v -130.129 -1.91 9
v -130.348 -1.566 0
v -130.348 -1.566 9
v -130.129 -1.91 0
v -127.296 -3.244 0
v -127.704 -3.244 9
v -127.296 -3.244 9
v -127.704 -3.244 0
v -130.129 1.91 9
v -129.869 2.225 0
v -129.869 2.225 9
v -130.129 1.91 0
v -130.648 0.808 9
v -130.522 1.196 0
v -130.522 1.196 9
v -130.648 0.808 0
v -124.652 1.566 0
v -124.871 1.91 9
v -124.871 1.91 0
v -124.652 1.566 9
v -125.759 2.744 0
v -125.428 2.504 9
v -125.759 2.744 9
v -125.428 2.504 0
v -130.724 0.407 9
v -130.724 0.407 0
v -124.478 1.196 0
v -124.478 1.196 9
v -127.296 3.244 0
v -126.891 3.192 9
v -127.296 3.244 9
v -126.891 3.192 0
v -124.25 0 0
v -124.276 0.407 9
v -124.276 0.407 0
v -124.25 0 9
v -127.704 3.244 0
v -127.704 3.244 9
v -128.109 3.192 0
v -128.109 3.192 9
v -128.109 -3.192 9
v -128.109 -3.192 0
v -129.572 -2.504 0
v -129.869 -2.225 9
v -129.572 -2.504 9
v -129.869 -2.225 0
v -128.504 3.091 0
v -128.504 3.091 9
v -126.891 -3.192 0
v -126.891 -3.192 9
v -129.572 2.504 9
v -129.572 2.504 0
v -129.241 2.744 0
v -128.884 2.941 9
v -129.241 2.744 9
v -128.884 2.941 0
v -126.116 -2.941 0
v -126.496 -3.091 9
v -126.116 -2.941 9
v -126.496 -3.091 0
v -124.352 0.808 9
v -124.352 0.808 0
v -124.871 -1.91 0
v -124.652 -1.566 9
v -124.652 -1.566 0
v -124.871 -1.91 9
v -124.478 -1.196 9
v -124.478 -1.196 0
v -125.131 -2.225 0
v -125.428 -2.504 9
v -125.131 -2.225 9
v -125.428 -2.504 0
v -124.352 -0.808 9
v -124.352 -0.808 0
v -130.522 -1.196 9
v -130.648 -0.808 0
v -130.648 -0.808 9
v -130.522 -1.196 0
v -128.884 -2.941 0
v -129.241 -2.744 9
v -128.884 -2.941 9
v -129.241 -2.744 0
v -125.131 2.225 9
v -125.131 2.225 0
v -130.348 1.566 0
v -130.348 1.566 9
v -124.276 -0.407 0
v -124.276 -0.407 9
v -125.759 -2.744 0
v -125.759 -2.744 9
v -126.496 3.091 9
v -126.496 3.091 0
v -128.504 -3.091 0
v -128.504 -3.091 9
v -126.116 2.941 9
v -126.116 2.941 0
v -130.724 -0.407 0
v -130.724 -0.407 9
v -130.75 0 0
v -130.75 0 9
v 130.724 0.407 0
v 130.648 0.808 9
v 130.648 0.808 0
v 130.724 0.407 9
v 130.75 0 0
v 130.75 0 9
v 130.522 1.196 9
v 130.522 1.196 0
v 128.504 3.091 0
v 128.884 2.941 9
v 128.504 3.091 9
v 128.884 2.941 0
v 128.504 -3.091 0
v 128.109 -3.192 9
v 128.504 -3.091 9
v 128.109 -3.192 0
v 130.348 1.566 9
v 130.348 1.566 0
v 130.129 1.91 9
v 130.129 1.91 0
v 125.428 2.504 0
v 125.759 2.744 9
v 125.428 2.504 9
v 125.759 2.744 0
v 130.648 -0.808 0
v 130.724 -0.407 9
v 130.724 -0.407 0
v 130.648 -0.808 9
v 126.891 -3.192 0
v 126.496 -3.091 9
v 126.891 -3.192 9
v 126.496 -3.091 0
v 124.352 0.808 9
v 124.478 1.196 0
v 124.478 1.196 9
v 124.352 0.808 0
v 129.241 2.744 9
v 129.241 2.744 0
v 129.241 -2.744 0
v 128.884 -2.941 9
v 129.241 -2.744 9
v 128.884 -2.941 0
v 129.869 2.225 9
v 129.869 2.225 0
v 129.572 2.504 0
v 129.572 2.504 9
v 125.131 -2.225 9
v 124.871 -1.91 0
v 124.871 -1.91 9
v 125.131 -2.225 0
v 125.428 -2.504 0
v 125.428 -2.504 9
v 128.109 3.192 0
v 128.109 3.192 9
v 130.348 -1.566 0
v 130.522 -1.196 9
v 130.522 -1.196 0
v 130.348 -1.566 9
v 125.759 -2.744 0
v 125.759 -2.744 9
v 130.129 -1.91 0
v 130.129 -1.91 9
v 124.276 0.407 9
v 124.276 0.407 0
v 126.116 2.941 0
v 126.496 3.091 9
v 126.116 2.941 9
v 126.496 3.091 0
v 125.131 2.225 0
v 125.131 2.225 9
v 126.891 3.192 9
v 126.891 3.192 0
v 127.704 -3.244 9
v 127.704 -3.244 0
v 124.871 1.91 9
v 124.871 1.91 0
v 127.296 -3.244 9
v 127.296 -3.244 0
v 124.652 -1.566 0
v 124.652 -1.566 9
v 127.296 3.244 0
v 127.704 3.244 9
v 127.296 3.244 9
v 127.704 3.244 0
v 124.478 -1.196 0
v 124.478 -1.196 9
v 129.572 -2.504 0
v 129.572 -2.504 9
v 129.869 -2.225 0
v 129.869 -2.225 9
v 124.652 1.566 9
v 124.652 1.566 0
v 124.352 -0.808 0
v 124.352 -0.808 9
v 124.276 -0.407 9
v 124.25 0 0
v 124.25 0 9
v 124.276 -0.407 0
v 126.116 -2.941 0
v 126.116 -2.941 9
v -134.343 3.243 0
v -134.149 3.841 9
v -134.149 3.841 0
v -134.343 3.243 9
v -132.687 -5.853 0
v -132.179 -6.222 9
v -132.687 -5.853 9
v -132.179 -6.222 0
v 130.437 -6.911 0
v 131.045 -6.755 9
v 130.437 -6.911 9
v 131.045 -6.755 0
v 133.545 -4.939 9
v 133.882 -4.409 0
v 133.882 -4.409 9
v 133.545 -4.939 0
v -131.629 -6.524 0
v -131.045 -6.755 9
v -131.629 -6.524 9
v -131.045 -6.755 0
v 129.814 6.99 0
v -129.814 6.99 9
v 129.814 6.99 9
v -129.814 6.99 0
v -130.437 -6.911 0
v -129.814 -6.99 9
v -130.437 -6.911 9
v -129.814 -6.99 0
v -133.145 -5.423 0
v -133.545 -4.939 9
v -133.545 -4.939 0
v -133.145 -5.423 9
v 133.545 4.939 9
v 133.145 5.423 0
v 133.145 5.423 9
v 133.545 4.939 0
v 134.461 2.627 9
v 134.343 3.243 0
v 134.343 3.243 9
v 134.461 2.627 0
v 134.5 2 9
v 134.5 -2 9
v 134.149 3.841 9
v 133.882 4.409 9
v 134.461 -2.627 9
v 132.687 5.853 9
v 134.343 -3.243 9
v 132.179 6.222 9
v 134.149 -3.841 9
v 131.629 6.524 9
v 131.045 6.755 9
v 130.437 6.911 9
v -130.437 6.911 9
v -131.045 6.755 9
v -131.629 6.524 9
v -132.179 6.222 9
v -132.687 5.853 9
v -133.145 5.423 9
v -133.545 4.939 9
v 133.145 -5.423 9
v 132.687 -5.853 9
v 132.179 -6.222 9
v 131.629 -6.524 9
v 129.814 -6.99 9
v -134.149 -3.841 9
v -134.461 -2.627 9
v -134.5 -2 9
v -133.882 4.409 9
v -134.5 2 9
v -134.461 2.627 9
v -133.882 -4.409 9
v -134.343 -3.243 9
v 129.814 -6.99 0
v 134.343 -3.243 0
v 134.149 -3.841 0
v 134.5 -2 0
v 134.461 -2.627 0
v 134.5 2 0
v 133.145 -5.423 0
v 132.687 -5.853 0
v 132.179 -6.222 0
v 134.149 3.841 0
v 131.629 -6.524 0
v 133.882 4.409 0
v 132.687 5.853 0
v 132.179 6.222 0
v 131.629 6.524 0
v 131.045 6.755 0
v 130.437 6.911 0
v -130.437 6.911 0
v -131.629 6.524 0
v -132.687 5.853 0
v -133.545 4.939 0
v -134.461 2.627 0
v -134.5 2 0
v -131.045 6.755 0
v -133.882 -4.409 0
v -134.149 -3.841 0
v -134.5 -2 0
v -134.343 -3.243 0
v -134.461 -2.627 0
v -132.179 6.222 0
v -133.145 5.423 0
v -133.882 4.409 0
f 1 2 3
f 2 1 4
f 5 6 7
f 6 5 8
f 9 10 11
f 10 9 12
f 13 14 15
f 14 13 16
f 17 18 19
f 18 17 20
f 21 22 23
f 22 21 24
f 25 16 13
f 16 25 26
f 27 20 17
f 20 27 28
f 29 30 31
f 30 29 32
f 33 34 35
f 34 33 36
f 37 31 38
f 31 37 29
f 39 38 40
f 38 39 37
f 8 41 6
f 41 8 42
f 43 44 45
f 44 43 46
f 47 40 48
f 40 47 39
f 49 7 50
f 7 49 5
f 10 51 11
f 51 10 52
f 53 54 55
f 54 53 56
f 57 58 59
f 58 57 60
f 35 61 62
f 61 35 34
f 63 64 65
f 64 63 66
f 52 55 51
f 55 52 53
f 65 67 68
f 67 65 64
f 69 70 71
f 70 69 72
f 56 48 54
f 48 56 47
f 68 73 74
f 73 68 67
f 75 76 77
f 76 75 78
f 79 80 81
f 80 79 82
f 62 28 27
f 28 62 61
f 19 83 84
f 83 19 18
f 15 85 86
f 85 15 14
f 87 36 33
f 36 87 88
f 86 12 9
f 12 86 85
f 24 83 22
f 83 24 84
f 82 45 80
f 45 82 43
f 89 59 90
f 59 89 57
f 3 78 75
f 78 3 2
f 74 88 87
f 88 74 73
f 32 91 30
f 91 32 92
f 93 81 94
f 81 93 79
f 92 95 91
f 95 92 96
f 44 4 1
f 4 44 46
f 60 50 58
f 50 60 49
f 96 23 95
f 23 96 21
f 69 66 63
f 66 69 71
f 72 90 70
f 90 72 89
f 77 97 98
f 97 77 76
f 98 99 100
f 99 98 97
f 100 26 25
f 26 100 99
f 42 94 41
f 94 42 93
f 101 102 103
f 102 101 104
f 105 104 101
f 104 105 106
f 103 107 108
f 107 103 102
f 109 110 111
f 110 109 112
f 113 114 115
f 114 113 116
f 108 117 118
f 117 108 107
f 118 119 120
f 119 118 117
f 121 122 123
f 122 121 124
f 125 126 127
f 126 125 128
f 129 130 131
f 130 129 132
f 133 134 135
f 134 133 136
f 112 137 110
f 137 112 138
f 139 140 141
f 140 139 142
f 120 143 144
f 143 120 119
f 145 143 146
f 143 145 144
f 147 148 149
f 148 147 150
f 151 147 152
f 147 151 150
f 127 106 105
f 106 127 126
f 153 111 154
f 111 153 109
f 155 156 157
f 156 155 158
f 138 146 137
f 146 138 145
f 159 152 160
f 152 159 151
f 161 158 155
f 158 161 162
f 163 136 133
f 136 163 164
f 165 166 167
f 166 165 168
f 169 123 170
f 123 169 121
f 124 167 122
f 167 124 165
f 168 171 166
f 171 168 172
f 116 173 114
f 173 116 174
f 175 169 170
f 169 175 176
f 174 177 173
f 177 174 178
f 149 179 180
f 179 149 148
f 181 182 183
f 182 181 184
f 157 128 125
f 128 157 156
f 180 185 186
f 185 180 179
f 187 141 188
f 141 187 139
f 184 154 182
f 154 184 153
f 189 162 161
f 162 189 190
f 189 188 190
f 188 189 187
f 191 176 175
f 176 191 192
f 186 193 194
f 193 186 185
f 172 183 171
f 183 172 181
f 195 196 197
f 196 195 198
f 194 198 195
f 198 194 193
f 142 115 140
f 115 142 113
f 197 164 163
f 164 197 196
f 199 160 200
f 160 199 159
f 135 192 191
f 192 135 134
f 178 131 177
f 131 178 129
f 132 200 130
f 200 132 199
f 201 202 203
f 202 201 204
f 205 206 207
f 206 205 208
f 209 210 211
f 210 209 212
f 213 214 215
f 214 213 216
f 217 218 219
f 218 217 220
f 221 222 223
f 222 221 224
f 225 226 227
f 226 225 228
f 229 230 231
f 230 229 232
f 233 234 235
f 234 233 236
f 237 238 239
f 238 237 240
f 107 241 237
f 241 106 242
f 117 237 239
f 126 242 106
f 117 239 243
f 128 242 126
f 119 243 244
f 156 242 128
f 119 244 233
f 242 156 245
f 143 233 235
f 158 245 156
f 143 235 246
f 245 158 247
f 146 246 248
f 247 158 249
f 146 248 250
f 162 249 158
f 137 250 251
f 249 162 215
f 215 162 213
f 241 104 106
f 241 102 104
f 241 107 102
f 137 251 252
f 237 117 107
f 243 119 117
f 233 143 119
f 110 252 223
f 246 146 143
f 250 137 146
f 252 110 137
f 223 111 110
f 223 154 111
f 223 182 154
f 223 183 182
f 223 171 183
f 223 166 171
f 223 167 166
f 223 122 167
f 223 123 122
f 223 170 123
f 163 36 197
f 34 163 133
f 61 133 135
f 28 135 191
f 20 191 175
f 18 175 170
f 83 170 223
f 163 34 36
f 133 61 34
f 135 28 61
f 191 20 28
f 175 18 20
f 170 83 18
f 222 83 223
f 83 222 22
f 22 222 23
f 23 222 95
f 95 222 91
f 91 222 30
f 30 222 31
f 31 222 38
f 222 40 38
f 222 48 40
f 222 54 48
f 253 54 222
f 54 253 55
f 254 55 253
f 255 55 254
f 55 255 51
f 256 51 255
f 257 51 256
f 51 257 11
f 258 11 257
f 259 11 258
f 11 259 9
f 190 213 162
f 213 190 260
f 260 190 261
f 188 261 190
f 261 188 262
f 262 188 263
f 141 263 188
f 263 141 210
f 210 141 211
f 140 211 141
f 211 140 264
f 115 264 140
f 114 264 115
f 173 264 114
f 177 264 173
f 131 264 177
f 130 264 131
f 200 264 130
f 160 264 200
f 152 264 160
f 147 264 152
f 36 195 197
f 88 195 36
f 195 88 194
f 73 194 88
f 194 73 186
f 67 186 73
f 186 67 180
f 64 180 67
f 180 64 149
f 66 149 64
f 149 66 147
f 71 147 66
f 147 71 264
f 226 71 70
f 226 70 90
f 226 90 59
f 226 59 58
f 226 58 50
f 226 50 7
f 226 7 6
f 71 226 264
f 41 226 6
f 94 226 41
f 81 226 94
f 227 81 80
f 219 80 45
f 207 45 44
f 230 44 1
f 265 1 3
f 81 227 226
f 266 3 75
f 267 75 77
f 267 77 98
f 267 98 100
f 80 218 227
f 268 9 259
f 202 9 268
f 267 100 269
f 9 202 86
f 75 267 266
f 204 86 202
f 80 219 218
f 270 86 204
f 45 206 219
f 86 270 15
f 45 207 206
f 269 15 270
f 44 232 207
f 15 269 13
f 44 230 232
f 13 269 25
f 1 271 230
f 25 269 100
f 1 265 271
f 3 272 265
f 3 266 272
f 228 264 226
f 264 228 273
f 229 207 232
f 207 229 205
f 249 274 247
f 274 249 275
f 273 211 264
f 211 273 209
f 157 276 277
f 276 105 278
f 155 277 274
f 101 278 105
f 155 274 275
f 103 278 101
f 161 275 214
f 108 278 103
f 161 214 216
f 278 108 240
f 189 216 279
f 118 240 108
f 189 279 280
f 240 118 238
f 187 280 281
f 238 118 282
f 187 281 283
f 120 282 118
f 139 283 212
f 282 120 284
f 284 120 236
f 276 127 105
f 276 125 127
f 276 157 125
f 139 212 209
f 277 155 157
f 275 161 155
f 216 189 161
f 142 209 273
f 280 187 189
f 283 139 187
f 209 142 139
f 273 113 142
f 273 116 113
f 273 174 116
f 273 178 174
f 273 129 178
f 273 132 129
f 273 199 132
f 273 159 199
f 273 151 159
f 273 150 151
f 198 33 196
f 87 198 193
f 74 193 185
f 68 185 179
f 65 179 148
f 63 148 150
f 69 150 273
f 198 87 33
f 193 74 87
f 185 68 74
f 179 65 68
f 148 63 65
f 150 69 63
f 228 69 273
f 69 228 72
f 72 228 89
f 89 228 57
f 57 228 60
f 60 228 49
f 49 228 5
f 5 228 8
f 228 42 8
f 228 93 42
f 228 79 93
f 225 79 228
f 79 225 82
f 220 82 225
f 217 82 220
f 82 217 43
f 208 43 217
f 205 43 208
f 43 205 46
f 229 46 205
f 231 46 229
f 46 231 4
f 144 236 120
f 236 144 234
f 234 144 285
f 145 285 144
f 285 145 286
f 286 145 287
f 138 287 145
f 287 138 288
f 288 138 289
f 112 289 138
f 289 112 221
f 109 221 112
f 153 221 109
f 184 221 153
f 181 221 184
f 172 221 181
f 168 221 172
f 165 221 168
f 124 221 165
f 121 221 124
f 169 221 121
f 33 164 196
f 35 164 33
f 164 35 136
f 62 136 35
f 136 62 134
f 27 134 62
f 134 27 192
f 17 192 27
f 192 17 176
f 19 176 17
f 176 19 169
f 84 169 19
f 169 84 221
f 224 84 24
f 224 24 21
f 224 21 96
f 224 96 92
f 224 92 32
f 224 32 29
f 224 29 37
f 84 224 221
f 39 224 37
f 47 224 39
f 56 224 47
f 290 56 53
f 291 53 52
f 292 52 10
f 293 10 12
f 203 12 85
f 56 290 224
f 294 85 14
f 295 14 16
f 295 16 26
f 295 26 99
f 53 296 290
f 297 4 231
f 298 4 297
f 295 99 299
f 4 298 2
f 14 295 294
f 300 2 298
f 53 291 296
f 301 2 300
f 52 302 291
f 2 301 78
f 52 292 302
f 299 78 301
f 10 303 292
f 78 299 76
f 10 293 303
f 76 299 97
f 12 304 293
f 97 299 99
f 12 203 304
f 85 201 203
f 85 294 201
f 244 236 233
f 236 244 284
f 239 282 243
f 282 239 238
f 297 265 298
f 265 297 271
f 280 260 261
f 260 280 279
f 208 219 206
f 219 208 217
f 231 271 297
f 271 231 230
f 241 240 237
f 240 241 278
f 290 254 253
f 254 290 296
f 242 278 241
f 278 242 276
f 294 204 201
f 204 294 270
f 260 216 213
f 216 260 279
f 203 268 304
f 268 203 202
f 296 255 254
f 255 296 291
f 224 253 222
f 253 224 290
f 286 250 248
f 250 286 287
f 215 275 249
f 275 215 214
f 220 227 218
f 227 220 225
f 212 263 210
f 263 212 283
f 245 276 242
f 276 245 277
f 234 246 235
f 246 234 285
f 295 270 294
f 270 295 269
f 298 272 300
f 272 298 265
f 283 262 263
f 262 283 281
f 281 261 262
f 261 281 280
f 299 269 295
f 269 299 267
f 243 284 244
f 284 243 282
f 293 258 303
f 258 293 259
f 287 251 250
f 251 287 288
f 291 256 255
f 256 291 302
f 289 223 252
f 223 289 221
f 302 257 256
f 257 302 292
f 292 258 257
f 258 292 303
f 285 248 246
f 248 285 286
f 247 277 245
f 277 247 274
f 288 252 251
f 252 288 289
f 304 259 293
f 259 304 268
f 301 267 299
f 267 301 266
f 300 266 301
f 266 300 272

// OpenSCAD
$fn = 50;


difference() {
	union() {
		hull() {
			translate(v = [-129.5000000000, 2.0000000000, 0]) {
				cylinder(h = 9, r = 5);
			}
			translate(v = [129.5000000000, 2.0000000000, 0]) {
				cylinder(h = 9, r = 5);
			}
			translate(v = [-129.5000000000, -2.0000000000, 0]) {
				cylinder(h = 9, r = 5);
			}
			translate(v = [129.5000000000, -2.0000000000, 0]) {
				cylinder(h = 9, r = 5);
			}
		}
	}
	union() {
		translate(v = [-127.5000000000, 0.0000000000, -100.0000000000]) {
			cylinder(h = 200, r = 3.2500000000);
		}
		translate(v = [-127.5000000000, 0.0000000000, -100.0000000000]) {
			cylinder(h = 200, r = 3.2500000000);
		}
		translate(v = [127.5000000000, 0.0000000000, -100.0000000000]) {
			cylinder(h = 200, r = 3.2500000000);
		}
		translate(v = [127.5000000000, 0.0000000000, -100.0000000000]) {
			cylinder(h = 200, r = 3.2500000000);
		}
	}
}
